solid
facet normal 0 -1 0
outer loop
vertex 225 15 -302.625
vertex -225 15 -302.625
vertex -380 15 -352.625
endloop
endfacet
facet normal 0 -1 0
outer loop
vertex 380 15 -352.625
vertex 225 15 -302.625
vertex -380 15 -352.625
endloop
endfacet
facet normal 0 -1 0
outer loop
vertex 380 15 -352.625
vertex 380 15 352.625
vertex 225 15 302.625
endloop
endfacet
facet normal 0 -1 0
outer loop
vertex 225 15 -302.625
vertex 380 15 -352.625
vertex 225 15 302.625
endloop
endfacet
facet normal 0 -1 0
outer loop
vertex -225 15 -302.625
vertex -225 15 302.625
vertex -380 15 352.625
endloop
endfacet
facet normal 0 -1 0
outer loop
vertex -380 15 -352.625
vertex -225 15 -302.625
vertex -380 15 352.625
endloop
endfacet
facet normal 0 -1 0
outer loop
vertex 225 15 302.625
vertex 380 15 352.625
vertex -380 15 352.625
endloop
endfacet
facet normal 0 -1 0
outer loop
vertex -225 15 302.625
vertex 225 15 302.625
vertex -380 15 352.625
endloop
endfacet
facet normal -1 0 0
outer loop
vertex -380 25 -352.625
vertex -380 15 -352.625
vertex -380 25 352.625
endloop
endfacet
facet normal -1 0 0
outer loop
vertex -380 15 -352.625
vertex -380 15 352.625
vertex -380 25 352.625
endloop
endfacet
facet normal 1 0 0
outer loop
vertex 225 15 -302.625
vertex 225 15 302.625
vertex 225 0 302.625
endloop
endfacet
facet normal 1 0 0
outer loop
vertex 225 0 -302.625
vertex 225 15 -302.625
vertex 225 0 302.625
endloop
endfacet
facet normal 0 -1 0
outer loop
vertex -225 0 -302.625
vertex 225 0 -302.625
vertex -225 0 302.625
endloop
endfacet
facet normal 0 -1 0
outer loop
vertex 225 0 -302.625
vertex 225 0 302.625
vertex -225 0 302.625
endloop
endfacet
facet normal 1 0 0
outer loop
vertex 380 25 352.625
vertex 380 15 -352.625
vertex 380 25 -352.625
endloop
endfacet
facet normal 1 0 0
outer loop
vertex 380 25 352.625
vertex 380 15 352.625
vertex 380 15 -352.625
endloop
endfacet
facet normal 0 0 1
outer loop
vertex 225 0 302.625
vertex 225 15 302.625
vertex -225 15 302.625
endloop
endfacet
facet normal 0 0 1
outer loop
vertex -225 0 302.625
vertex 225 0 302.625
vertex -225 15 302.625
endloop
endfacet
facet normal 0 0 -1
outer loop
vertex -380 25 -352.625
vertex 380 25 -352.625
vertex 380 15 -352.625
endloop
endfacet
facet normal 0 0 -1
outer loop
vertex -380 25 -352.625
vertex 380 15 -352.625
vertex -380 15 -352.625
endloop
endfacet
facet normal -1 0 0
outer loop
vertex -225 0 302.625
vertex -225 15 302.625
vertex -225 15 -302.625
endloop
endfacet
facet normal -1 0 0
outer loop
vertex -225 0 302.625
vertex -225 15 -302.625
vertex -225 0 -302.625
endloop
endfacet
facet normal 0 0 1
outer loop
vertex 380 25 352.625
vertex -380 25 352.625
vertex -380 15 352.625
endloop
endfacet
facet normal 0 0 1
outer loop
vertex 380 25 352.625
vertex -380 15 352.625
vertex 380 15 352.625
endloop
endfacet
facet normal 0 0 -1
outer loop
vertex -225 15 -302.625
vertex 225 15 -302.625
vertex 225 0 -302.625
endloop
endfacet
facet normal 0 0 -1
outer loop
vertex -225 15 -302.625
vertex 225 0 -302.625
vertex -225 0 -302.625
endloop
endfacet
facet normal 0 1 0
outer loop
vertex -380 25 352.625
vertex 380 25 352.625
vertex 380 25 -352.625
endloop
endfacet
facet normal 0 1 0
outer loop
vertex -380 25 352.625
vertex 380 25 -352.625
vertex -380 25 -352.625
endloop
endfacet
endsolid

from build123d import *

# Parameters (mm, degrees)
BOSS_EXTRUDE1_DEPTH = 302.625
SKETCH3_W           = 760
SKETCH3_H           = 10
BOSS_EXTRUDE2_DEPTH = 50
SKETCH4_W           = 760
SKETCH4_H           = 10
BOSS_EXTRUDE3_DEPTH = 50


with BuildPart() as part:
    # Sketch2 → Boss-Extrude1 (new body, symmetric)
    with BuildSketch(Plane.XY):
        Polygon((0, 25), (-380, 25), (-380, 15), (-225, 15), (-225, 0), (0, 0), align=None)
    boss_extrude1 = extrude(amount=BOSS_EXTRUDE1_DEPTH, both=True)

    # Mirror1: Boss-Extrude1 across plane
    add(boss_extrude1.mirror(Plane(origin=(0, 25, 302.625), x_dir=(0, 0, 1), z_dir=(-1, 0, 0))))

    # Sketch3 → Boss-Extrude2 (add)
    with BuildSketch(Plane.XY.offset(302.625)):
        with Locations((0, 20)):
            Rectangle(SKETCH3_W, SKETCH3_H)
    extrude(amount=BOSS_EXTRUDE2_DEPTH)

    # Sketch4 → Boss-Extrude3 (add)
    with BuildSketch(Plane(origin=(0, 0, -302.625), x_dir=(-1, 0, 0), z_dir=(0, 0, -1))):
        with Locations((0, 20)):
            Rectangle(SKETCH4_W, SKETCH4_H)
    extrude(amount=BOSS_EXTRUDE3_DEPTH)


solid = part.part
